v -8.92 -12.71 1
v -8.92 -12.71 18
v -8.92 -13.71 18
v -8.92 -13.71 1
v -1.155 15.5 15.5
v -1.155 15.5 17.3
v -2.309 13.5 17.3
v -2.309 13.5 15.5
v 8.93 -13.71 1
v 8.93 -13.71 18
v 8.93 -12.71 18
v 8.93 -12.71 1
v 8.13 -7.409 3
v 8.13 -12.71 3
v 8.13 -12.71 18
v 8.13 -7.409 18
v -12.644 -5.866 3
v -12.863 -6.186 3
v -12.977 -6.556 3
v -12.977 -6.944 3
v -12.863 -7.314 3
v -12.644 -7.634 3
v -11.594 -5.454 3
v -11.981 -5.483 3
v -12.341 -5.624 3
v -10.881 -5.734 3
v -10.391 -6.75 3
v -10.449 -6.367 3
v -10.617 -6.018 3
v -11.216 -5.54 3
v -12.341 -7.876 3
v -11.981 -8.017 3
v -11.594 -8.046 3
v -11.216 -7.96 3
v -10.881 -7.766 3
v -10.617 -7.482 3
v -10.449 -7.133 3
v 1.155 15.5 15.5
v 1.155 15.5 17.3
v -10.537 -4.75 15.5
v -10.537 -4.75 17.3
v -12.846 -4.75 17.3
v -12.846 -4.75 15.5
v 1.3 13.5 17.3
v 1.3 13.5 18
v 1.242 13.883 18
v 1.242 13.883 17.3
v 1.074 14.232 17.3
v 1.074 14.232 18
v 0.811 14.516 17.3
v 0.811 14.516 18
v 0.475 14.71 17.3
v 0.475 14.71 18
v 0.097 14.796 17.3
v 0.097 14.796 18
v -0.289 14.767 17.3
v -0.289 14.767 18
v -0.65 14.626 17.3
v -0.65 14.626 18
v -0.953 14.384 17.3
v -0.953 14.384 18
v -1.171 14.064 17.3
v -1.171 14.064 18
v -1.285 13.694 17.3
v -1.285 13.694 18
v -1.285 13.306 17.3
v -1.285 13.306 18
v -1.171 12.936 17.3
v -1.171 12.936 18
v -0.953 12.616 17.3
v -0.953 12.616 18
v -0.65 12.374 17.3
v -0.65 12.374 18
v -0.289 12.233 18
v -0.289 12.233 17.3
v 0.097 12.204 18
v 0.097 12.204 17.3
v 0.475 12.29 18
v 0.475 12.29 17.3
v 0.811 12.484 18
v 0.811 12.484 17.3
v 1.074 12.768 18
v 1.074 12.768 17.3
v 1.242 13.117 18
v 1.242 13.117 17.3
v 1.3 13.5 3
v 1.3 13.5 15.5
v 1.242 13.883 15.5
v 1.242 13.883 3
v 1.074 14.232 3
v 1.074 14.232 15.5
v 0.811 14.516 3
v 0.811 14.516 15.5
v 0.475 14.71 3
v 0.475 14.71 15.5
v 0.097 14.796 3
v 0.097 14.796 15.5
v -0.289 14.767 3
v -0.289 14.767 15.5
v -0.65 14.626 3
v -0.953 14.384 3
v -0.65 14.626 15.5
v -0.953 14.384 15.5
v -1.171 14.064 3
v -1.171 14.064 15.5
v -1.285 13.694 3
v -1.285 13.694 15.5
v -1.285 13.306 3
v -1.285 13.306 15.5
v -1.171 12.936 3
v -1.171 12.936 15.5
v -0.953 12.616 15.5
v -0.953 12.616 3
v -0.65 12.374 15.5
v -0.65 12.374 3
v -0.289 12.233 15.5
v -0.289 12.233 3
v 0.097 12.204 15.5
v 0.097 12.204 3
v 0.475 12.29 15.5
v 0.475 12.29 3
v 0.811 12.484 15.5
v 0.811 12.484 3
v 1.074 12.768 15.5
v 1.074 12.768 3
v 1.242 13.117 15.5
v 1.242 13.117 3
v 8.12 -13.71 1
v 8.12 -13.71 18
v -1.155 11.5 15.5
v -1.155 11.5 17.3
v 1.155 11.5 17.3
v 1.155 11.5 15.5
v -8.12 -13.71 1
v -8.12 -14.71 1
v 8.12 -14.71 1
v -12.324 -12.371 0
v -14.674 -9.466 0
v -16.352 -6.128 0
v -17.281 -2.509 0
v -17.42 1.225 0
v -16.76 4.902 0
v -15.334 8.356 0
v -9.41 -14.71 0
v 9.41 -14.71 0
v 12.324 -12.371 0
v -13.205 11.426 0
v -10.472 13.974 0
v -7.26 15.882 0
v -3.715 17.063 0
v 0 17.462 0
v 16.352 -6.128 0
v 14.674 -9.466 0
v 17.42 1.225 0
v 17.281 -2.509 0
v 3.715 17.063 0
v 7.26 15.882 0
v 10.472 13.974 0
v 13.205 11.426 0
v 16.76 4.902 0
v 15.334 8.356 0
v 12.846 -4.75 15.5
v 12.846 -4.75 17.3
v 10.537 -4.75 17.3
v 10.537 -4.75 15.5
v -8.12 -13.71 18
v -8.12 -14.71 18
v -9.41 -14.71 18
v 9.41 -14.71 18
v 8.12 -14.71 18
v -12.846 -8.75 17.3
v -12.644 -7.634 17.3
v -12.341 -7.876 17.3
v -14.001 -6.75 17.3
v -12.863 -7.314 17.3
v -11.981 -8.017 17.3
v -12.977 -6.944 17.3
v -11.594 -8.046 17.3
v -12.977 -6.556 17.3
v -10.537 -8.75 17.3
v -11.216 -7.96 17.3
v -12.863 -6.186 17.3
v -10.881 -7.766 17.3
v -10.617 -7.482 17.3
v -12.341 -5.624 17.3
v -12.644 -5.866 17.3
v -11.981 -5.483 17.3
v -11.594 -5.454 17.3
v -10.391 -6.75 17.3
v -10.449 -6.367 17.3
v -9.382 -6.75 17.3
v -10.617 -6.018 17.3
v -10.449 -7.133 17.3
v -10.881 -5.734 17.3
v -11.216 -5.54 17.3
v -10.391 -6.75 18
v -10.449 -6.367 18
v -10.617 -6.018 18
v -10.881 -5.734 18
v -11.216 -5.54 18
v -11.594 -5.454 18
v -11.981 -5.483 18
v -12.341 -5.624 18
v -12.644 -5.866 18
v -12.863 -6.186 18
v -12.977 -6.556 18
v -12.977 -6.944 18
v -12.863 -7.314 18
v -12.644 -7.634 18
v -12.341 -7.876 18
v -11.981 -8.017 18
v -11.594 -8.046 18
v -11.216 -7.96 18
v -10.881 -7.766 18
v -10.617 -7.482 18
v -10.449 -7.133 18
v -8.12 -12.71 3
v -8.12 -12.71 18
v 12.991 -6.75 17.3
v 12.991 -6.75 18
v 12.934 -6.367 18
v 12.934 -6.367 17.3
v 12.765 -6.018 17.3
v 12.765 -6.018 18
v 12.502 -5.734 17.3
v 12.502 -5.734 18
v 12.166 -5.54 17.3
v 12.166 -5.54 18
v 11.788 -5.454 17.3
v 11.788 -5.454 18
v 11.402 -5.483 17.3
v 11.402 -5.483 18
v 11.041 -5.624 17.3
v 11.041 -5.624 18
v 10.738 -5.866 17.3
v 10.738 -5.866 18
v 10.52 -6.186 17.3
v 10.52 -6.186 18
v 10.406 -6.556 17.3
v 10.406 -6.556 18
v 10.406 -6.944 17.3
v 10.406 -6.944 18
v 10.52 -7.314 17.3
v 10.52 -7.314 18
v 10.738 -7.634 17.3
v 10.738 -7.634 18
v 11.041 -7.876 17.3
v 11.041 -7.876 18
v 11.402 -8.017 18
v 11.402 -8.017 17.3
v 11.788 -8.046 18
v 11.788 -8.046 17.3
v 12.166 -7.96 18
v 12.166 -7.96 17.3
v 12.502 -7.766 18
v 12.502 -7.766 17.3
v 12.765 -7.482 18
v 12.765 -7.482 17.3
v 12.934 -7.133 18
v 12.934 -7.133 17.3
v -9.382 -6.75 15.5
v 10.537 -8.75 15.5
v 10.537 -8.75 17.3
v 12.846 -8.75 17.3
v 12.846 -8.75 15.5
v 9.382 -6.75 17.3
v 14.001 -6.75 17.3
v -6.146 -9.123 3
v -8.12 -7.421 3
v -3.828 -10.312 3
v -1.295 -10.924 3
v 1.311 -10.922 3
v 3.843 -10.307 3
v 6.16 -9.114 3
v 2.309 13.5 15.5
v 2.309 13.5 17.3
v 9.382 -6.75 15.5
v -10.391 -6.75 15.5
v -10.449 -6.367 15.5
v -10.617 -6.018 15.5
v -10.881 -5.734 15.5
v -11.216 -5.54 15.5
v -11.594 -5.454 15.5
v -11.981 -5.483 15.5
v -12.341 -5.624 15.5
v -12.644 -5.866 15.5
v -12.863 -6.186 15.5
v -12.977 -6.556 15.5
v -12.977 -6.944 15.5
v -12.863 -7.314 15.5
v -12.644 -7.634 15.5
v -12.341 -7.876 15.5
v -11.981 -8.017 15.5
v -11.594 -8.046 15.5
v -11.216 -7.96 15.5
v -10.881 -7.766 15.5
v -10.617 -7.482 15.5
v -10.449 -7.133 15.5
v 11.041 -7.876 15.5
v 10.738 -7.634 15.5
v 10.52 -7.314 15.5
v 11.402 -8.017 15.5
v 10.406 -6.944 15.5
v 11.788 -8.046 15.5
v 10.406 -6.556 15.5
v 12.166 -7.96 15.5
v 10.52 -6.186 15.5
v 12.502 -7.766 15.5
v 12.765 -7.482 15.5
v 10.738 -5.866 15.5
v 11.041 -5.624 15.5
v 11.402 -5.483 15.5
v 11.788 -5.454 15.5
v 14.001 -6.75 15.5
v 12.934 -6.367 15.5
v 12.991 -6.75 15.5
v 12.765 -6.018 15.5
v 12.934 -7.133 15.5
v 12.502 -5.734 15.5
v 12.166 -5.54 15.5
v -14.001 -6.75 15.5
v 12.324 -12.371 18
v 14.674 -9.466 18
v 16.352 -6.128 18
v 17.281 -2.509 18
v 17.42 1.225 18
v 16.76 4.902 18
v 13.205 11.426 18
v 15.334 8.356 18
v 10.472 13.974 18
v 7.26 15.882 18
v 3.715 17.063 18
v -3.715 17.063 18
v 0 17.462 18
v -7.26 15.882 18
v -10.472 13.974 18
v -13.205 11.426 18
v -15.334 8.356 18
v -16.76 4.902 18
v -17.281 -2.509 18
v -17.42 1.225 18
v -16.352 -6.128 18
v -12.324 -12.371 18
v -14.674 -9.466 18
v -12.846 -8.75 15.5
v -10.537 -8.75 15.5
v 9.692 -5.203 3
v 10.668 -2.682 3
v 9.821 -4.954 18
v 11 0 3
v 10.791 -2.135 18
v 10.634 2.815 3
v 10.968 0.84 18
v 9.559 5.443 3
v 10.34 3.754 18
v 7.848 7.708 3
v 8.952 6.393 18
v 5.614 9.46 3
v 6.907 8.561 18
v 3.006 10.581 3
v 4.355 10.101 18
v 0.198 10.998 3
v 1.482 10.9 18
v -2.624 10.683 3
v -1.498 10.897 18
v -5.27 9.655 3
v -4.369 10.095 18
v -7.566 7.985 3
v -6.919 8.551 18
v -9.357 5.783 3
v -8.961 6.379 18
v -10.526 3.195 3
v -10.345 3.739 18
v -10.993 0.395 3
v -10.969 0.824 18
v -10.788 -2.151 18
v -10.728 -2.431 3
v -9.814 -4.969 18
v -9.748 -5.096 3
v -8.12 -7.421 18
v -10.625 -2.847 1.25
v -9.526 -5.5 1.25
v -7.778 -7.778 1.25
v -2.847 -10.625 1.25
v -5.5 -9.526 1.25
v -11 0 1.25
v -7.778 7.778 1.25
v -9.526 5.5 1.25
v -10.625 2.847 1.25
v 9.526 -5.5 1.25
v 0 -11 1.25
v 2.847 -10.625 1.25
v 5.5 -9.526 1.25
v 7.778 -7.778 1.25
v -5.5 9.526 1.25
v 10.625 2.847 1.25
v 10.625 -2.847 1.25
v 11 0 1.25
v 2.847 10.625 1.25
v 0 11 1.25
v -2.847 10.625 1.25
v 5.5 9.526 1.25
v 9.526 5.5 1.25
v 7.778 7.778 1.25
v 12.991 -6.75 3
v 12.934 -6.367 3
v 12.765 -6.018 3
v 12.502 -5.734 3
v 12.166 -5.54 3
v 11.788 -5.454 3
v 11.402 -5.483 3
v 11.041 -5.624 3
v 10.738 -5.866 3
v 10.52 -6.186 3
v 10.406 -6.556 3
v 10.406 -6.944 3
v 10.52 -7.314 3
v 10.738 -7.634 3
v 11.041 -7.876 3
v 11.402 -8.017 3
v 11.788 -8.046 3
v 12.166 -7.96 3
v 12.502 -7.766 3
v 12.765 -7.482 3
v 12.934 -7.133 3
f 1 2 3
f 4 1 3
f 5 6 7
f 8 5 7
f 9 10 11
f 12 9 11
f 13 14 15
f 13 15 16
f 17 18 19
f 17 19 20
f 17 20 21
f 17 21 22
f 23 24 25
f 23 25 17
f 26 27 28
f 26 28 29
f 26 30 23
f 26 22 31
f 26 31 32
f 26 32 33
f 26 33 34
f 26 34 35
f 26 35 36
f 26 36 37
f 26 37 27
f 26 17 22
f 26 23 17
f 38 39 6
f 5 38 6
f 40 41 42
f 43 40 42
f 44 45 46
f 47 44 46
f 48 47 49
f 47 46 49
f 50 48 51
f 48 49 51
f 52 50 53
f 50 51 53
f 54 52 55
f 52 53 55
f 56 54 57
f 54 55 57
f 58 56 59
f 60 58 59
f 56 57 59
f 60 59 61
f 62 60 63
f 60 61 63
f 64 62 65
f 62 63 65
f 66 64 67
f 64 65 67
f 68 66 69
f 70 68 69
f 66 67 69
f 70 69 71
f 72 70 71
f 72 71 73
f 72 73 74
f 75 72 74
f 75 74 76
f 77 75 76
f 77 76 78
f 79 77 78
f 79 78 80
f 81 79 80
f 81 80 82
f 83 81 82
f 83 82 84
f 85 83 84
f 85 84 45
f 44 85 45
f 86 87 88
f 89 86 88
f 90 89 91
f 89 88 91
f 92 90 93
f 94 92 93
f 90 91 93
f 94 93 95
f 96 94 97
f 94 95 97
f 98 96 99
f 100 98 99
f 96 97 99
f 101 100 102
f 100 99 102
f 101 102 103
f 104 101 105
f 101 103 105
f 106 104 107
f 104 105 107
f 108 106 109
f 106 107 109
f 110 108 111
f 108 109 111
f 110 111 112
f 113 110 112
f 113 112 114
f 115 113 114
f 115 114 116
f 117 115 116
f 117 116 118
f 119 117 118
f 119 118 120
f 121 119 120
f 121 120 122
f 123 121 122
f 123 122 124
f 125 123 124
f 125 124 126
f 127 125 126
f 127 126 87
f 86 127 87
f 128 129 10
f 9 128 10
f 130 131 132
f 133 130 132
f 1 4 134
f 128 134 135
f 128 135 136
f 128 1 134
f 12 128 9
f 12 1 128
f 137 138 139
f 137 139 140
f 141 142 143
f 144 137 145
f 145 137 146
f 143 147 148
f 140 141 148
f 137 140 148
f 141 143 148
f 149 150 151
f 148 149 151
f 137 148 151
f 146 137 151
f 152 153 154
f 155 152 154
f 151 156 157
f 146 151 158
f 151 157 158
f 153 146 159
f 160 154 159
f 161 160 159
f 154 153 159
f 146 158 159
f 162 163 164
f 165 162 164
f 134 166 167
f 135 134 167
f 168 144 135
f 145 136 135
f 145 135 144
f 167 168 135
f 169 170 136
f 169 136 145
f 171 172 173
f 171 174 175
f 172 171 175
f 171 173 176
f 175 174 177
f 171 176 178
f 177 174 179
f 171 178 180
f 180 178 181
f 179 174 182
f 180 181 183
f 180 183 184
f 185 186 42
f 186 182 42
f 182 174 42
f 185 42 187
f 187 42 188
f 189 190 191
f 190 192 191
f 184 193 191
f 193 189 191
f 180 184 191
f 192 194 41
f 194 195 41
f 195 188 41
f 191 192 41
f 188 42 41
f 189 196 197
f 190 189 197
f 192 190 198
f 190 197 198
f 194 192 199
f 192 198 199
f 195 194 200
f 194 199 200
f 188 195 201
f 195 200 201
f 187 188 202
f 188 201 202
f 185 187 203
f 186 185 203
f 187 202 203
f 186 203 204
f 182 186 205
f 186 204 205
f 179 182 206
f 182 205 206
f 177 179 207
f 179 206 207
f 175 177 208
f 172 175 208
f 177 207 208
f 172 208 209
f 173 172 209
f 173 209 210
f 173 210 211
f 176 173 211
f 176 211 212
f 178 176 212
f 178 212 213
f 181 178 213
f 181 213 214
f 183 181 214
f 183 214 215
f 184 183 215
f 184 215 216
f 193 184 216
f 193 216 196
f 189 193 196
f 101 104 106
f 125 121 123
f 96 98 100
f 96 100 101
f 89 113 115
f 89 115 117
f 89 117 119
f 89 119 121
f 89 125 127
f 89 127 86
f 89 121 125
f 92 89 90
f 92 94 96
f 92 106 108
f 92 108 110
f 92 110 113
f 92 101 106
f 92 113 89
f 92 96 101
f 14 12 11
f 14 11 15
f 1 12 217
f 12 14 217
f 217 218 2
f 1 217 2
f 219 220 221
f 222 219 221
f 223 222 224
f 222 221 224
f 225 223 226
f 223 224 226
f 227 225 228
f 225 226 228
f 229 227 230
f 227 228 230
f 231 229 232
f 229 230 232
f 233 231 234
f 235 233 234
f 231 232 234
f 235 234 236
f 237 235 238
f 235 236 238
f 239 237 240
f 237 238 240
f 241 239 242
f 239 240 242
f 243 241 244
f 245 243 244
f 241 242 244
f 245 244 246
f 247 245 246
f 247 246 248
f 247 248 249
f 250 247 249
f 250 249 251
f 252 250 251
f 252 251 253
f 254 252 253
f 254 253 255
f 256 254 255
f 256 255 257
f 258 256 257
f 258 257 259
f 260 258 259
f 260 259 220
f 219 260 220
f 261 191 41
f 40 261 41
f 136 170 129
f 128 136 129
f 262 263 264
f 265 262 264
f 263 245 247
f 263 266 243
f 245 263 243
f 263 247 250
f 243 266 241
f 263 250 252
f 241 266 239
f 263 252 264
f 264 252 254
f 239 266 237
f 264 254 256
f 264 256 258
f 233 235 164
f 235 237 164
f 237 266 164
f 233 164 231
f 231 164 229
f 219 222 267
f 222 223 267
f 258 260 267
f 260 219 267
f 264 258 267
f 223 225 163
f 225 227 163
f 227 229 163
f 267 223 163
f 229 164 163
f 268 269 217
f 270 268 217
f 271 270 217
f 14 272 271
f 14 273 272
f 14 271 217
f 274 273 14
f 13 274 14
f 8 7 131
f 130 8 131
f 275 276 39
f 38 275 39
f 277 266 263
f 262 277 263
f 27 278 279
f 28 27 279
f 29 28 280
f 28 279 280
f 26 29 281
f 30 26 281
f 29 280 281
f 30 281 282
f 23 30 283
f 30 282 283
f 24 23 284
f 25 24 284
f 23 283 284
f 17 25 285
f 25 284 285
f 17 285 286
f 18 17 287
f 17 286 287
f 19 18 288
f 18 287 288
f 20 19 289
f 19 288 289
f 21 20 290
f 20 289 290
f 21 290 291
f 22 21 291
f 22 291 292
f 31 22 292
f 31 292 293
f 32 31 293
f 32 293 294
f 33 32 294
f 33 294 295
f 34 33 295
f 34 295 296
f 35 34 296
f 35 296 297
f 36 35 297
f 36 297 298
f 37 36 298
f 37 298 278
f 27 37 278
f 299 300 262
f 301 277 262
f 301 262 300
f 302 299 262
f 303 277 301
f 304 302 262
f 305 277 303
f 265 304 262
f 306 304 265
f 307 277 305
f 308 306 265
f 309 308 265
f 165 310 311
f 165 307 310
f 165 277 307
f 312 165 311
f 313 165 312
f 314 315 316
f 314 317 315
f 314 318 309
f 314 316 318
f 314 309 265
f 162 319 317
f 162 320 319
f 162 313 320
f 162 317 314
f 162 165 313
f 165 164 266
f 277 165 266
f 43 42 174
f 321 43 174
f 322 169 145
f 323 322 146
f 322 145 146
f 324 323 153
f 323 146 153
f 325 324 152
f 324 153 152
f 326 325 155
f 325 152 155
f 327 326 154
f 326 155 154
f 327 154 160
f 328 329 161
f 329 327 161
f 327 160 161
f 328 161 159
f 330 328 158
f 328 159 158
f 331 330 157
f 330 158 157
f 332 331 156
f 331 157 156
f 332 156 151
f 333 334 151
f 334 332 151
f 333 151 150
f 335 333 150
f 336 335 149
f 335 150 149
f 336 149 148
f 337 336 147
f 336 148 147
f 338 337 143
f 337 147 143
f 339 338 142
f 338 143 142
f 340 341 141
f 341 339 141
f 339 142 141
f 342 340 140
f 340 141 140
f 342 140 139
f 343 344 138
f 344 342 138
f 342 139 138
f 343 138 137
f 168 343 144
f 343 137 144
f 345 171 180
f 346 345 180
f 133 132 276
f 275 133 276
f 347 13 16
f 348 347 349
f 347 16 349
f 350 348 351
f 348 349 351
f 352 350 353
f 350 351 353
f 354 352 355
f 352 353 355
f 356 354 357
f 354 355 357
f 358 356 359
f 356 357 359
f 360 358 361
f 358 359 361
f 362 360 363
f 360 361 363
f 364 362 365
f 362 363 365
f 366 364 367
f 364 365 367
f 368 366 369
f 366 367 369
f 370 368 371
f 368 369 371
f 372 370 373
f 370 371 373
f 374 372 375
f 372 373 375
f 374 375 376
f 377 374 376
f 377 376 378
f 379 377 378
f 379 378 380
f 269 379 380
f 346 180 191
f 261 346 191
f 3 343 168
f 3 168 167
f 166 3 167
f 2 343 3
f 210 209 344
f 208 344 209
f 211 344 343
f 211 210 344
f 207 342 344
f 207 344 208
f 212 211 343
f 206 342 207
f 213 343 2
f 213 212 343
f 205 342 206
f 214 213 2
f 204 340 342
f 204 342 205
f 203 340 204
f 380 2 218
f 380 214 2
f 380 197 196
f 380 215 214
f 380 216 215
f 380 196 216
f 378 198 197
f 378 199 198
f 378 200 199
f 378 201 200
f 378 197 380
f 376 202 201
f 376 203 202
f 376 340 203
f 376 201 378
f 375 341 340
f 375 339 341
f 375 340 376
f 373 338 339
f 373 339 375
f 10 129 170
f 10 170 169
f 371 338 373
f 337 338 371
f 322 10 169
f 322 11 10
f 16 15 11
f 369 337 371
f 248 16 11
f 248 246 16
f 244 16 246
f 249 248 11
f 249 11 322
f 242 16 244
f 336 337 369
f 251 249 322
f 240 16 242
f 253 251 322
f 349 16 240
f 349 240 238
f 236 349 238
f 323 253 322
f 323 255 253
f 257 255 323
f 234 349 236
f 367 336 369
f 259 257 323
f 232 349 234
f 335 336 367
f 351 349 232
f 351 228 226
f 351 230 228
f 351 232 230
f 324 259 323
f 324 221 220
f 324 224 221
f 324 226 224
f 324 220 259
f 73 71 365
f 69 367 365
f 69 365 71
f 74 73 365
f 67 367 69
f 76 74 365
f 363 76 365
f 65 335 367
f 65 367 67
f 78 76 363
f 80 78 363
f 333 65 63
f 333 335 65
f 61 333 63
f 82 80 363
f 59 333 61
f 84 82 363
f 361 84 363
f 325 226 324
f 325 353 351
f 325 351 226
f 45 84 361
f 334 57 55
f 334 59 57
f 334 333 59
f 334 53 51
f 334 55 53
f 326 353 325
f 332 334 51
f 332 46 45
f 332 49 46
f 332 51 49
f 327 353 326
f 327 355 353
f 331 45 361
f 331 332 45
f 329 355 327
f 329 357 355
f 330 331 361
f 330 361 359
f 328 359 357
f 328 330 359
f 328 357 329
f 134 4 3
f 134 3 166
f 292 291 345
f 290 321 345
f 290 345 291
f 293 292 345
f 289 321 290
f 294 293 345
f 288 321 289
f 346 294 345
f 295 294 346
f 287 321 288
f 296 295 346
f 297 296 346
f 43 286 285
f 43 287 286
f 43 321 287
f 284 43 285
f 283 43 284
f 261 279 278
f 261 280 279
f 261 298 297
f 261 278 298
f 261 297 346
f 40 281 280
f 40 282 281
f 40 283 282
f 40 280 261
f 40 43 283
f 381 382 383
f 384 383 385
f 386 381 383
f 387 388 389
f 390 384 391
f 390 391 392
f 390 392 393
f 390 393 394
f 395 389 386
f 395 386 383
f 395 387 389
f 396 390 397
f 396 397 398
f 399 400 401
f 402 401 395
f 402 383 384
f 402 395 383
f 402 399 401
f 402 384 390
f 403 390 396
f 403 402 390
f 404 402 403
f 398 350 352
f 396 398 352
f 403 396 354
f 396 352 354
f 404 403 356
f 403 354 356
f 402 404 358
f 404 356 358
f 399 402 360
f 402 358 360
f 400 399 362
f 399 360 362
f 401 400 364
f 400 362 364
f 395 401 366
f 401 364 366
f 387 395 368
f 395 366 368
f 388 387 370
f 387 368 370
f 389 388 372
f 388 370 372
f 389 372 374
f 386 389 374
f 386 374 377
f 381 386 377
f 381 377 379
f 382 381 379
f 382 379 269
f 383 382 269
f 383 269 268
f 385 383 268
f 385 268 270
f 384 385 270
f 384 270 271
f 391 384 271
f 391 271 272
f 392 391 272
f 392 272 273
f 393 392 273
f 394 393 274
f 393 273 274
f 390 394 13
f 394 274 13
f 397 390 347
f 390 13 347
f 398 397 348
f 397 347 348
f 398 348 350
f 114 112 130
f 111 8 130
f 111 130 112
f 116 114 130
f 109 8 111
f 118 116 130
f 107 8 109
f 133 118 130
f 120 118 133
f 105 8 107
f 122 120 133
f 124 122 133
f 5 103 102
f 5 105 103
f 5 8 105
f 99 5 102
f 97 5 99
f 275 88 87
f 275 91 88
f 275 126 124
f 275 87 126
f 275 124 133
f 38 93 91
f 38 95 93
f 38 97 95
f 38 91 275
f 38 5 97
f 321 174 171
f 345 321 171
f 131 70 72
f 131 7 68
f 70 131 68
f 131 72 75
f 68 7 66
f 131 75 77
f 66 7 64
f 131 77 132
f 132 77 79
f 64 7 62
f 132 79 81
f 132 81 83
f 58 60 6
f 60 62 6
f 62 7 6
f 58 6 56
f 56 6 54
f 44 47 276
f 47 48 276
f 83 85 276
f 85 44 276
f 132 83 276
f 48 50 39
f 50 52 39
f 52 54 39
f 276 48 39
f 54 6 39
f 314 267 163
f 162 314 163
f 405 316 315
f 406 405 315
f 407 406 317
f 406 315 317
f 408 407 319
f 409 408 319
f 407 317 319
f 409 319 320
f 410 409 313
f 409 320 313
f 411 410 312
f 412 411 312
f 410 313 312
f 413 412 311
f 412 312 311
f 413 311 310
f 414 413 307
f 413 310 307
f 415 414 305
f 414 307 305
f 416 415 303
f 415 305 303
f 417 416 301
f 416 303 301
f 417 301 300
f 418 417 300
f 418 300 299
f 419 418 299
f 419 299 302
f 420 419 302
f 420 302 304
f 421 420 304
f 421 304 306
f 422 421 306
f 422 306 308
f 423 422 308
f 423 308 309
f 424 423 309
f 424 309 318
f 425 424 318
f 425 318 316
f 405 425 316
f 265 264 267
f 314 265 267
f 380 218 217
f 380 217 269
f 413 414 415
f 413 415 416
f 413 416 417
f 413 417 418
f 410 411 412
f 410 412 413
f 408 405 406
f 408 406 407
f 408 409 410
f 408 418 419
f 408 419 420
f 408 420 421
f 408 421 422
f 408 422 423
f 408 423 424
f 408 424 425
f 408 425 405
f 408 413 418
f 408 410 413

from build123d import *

# Parameters (mm, degrees)
SKETCH2_R           = 17.4625
BOSS_EXTRUDE1_DEPTH = 18
SKETCH13_R          = 1.3
CUT_EXTRUDE6_DEPTH  = 15
SKETCH16_R          = 11
CUT_EXTRUDE9_DEPTH  = 15
CUT_EXTRUDE11_DEPTH = 22
SKETCH21_W          = 16.25
SKETCH21_H          = 2.78436417
CUT_EXTRUDE12_DEPTH = 31.559414466
CUT_EXTRUDE13_REACH = 32.559
SKETCH24_W          = 16.25
SKETCH24_H          = 6.70136321
CUT_EXTRUDE14_DEPTH = 17
SKETCH27_W          = 18.82071266
SKETCH27_H          = 0.75
CUT_EXTRUDE15_DEPTH = 31.559414466
CUT_EXTRUDE16_START = 14.3
CUT_EXTRUDE16_DEPTH = 1.8
SKETCH29_R          = 11
CUT_EXTRUDE17_DEPTH = 1.75


with BuildPart() as part:
    # Sketch2 → Boss-Extrude1 (new body)
    with BuildSketch(Plane.XY):
        Circle(SKETCH2_R)
    extrude(amount=BOSS_EXTRUDE1_DEPTH)

    # Sketch13 → Cut-Extrude6 (cut)
    with BuildSketch(Plane.XY.offset(18)):
        with Locations((0, 13.5)):
            Circle(SKETCH13_R)
        with Locations((11.691342951, -6.75)):
            Circle(SKETCH13_R)
        with Locations((-11.691342951, -6.75)):
            Circle(SKETCH13_R)
    extrude(amount=-CUT_EXTRUDE6_DEPTH, mode=Mode.SUBTRACT)

    # Sketch16 → Cut-Extrude9 (cut)
    with BuildSketch(Plane.XY.offset(18)):
        Circle(SKETCH16_R)
    extrude(amount=-CUT_EXTRUDE9_DEPTH, mode=Mode.SUBTRACT)

    # Sketch20 → Cut-Extrude11 (cut)
    with BuildSketch(Plane(origin=(5.95728493, 0, -11.08430825), x_dir=(0, 0, 1), z_dir=(0, 1, 0))):
        Polygon((16.52930825, -11.021800725), (16.52930825, -6.906800725), (14.92930825, -6.906800725), (14.92930825, -4.926800725), (16.52930825, -4.926800725), (16.52930825, -0.811800725), (18.05430825, -0.811800725), (18.05430825, 1.028199275), (22.11430825, 1.028199275), (22.11430825, -0.811800725), (23.63930825, -0.811800725), (23.63930825, -11.021800725), (22.11430825, -11.021800725), (22.11430825, -12.861800725), (18.05430825, -12.861800725), (18.05430825, -11.021800725), align=None)
    extrude(amount=-CUT_EXTRUDE11_DEPTH, mode=Mode.SUBTRACT)

    # Sketch21 → Cut-Extrude12 (cut, through all)
    with BuildSketch(Plane.XY.offset(18)):
        with Locations((0, -16.852182085)):
            Rectangle(SKETCH21_W, SKETCH21_H)
    extrude(amount=-CUT_EXTRUDE12_DEPTH, mode=Mode.SUBTRACT)

    # Cut-Extrude13: up to this face of the body (flat: up to its plane)
    cut_extrude13_end = Plane(part.part.faces().sort_by_distance((0, 0, 3))[0])
    # Sketch24 → Cut-Extrude13 (cut, up to the picked face)
    with BuildSketch(Plane.XY.offset(18), mode=Mode.PRIVATE) as cut_extrude13_sk1:
        with Locations((0.005436819, -10.109318395)):
            Rectangle(SKETCH24_W, SKETCH24_H)
    cut_extrude13_tool1 = split(extrude(cut_extrude13_sk1.sketch, amount=-CUT_EXTRUDE13_REACH, mode=Mode.PRIVATE), bisect_by=cut_extrude13_end, keep=Keep.BOTH, mode=Mode.PRIVATE)
    add(cut_extrude13_tool1.solids().sort_by(Axis((0.005437, -10.109318, 18), (0, 0, -1)))[0], mode=Mode.SUBTRACT)

    # Sketch26 → Cut-Extrude14 (cut)
    with BuildSketch(Plane.XY.offset(18)):
        Polygon((-8.119563181, -13.71), (-8.119563181, -15.46), (8.119563181, -15.46), (8.119563181, -13.71), (8.930436819, -13.71), (8.930436819, -12.71), (-8.919563181, -12.71), (-8.919563181, -13.71), align=None)
    extrude(amount=-CUT_EXTRUDE14_DEPTH, mode=Mode.SUBTRACT)

    # Sketch27 → Cut-Extrude15 (cut, through all)
    with BuildSketch(Plane.XY.offset(18)):
        with Locations((0, -15.085)):
            Rectangle(SKETCH27_W, SKETCH27_H)
    extrude(amount=-CUT_EXTRUDE15_DEPTH, mode=Mode.SUBTRACT)

    # Sketch28 → Cut-Extrude16 (cut)
    with BuildSketch(Plane.XY.offset(3).offset(CUT_EXTRUDE16_START)):
        Polygon((2.309401077, 13.5), (1.154700538, 15.5), (-1.154700538, 15.5), (-2.309401077, 13.5), (-1.154700538, 11.5), (1.154700538, 11.5), align=None)
        Polygon((-9.381941874, -6.75), (-10.536642413, -4.75), (-12.846043489, -4.75), (-14.000744028, -6.75), (-12.846043489, -8.75), (-10.536642413, -8.75), align=None)
        Polygon((14.000744028, -6.75), (12.846043489, -4.75), (10.536642413, -4.75), (9.381941874, -6.75), (10.536642413, -8.75), (12.846043489, -8.75), align=None)
    extrude(amount=-CUT_EXTRUDE16_DEPTH, mode=Mode.SUBTRACT)

    # Sketch29 → Cut-Extrude17 (cut)
    with BuildSketch(Plane.XY.offset(3)):
        Circle(SKETCH29_R)
    extrude(amount=-CUT_EXTRUDE17_DEPTH, mode=Mode.SUBTRACT)


solid = part.part
